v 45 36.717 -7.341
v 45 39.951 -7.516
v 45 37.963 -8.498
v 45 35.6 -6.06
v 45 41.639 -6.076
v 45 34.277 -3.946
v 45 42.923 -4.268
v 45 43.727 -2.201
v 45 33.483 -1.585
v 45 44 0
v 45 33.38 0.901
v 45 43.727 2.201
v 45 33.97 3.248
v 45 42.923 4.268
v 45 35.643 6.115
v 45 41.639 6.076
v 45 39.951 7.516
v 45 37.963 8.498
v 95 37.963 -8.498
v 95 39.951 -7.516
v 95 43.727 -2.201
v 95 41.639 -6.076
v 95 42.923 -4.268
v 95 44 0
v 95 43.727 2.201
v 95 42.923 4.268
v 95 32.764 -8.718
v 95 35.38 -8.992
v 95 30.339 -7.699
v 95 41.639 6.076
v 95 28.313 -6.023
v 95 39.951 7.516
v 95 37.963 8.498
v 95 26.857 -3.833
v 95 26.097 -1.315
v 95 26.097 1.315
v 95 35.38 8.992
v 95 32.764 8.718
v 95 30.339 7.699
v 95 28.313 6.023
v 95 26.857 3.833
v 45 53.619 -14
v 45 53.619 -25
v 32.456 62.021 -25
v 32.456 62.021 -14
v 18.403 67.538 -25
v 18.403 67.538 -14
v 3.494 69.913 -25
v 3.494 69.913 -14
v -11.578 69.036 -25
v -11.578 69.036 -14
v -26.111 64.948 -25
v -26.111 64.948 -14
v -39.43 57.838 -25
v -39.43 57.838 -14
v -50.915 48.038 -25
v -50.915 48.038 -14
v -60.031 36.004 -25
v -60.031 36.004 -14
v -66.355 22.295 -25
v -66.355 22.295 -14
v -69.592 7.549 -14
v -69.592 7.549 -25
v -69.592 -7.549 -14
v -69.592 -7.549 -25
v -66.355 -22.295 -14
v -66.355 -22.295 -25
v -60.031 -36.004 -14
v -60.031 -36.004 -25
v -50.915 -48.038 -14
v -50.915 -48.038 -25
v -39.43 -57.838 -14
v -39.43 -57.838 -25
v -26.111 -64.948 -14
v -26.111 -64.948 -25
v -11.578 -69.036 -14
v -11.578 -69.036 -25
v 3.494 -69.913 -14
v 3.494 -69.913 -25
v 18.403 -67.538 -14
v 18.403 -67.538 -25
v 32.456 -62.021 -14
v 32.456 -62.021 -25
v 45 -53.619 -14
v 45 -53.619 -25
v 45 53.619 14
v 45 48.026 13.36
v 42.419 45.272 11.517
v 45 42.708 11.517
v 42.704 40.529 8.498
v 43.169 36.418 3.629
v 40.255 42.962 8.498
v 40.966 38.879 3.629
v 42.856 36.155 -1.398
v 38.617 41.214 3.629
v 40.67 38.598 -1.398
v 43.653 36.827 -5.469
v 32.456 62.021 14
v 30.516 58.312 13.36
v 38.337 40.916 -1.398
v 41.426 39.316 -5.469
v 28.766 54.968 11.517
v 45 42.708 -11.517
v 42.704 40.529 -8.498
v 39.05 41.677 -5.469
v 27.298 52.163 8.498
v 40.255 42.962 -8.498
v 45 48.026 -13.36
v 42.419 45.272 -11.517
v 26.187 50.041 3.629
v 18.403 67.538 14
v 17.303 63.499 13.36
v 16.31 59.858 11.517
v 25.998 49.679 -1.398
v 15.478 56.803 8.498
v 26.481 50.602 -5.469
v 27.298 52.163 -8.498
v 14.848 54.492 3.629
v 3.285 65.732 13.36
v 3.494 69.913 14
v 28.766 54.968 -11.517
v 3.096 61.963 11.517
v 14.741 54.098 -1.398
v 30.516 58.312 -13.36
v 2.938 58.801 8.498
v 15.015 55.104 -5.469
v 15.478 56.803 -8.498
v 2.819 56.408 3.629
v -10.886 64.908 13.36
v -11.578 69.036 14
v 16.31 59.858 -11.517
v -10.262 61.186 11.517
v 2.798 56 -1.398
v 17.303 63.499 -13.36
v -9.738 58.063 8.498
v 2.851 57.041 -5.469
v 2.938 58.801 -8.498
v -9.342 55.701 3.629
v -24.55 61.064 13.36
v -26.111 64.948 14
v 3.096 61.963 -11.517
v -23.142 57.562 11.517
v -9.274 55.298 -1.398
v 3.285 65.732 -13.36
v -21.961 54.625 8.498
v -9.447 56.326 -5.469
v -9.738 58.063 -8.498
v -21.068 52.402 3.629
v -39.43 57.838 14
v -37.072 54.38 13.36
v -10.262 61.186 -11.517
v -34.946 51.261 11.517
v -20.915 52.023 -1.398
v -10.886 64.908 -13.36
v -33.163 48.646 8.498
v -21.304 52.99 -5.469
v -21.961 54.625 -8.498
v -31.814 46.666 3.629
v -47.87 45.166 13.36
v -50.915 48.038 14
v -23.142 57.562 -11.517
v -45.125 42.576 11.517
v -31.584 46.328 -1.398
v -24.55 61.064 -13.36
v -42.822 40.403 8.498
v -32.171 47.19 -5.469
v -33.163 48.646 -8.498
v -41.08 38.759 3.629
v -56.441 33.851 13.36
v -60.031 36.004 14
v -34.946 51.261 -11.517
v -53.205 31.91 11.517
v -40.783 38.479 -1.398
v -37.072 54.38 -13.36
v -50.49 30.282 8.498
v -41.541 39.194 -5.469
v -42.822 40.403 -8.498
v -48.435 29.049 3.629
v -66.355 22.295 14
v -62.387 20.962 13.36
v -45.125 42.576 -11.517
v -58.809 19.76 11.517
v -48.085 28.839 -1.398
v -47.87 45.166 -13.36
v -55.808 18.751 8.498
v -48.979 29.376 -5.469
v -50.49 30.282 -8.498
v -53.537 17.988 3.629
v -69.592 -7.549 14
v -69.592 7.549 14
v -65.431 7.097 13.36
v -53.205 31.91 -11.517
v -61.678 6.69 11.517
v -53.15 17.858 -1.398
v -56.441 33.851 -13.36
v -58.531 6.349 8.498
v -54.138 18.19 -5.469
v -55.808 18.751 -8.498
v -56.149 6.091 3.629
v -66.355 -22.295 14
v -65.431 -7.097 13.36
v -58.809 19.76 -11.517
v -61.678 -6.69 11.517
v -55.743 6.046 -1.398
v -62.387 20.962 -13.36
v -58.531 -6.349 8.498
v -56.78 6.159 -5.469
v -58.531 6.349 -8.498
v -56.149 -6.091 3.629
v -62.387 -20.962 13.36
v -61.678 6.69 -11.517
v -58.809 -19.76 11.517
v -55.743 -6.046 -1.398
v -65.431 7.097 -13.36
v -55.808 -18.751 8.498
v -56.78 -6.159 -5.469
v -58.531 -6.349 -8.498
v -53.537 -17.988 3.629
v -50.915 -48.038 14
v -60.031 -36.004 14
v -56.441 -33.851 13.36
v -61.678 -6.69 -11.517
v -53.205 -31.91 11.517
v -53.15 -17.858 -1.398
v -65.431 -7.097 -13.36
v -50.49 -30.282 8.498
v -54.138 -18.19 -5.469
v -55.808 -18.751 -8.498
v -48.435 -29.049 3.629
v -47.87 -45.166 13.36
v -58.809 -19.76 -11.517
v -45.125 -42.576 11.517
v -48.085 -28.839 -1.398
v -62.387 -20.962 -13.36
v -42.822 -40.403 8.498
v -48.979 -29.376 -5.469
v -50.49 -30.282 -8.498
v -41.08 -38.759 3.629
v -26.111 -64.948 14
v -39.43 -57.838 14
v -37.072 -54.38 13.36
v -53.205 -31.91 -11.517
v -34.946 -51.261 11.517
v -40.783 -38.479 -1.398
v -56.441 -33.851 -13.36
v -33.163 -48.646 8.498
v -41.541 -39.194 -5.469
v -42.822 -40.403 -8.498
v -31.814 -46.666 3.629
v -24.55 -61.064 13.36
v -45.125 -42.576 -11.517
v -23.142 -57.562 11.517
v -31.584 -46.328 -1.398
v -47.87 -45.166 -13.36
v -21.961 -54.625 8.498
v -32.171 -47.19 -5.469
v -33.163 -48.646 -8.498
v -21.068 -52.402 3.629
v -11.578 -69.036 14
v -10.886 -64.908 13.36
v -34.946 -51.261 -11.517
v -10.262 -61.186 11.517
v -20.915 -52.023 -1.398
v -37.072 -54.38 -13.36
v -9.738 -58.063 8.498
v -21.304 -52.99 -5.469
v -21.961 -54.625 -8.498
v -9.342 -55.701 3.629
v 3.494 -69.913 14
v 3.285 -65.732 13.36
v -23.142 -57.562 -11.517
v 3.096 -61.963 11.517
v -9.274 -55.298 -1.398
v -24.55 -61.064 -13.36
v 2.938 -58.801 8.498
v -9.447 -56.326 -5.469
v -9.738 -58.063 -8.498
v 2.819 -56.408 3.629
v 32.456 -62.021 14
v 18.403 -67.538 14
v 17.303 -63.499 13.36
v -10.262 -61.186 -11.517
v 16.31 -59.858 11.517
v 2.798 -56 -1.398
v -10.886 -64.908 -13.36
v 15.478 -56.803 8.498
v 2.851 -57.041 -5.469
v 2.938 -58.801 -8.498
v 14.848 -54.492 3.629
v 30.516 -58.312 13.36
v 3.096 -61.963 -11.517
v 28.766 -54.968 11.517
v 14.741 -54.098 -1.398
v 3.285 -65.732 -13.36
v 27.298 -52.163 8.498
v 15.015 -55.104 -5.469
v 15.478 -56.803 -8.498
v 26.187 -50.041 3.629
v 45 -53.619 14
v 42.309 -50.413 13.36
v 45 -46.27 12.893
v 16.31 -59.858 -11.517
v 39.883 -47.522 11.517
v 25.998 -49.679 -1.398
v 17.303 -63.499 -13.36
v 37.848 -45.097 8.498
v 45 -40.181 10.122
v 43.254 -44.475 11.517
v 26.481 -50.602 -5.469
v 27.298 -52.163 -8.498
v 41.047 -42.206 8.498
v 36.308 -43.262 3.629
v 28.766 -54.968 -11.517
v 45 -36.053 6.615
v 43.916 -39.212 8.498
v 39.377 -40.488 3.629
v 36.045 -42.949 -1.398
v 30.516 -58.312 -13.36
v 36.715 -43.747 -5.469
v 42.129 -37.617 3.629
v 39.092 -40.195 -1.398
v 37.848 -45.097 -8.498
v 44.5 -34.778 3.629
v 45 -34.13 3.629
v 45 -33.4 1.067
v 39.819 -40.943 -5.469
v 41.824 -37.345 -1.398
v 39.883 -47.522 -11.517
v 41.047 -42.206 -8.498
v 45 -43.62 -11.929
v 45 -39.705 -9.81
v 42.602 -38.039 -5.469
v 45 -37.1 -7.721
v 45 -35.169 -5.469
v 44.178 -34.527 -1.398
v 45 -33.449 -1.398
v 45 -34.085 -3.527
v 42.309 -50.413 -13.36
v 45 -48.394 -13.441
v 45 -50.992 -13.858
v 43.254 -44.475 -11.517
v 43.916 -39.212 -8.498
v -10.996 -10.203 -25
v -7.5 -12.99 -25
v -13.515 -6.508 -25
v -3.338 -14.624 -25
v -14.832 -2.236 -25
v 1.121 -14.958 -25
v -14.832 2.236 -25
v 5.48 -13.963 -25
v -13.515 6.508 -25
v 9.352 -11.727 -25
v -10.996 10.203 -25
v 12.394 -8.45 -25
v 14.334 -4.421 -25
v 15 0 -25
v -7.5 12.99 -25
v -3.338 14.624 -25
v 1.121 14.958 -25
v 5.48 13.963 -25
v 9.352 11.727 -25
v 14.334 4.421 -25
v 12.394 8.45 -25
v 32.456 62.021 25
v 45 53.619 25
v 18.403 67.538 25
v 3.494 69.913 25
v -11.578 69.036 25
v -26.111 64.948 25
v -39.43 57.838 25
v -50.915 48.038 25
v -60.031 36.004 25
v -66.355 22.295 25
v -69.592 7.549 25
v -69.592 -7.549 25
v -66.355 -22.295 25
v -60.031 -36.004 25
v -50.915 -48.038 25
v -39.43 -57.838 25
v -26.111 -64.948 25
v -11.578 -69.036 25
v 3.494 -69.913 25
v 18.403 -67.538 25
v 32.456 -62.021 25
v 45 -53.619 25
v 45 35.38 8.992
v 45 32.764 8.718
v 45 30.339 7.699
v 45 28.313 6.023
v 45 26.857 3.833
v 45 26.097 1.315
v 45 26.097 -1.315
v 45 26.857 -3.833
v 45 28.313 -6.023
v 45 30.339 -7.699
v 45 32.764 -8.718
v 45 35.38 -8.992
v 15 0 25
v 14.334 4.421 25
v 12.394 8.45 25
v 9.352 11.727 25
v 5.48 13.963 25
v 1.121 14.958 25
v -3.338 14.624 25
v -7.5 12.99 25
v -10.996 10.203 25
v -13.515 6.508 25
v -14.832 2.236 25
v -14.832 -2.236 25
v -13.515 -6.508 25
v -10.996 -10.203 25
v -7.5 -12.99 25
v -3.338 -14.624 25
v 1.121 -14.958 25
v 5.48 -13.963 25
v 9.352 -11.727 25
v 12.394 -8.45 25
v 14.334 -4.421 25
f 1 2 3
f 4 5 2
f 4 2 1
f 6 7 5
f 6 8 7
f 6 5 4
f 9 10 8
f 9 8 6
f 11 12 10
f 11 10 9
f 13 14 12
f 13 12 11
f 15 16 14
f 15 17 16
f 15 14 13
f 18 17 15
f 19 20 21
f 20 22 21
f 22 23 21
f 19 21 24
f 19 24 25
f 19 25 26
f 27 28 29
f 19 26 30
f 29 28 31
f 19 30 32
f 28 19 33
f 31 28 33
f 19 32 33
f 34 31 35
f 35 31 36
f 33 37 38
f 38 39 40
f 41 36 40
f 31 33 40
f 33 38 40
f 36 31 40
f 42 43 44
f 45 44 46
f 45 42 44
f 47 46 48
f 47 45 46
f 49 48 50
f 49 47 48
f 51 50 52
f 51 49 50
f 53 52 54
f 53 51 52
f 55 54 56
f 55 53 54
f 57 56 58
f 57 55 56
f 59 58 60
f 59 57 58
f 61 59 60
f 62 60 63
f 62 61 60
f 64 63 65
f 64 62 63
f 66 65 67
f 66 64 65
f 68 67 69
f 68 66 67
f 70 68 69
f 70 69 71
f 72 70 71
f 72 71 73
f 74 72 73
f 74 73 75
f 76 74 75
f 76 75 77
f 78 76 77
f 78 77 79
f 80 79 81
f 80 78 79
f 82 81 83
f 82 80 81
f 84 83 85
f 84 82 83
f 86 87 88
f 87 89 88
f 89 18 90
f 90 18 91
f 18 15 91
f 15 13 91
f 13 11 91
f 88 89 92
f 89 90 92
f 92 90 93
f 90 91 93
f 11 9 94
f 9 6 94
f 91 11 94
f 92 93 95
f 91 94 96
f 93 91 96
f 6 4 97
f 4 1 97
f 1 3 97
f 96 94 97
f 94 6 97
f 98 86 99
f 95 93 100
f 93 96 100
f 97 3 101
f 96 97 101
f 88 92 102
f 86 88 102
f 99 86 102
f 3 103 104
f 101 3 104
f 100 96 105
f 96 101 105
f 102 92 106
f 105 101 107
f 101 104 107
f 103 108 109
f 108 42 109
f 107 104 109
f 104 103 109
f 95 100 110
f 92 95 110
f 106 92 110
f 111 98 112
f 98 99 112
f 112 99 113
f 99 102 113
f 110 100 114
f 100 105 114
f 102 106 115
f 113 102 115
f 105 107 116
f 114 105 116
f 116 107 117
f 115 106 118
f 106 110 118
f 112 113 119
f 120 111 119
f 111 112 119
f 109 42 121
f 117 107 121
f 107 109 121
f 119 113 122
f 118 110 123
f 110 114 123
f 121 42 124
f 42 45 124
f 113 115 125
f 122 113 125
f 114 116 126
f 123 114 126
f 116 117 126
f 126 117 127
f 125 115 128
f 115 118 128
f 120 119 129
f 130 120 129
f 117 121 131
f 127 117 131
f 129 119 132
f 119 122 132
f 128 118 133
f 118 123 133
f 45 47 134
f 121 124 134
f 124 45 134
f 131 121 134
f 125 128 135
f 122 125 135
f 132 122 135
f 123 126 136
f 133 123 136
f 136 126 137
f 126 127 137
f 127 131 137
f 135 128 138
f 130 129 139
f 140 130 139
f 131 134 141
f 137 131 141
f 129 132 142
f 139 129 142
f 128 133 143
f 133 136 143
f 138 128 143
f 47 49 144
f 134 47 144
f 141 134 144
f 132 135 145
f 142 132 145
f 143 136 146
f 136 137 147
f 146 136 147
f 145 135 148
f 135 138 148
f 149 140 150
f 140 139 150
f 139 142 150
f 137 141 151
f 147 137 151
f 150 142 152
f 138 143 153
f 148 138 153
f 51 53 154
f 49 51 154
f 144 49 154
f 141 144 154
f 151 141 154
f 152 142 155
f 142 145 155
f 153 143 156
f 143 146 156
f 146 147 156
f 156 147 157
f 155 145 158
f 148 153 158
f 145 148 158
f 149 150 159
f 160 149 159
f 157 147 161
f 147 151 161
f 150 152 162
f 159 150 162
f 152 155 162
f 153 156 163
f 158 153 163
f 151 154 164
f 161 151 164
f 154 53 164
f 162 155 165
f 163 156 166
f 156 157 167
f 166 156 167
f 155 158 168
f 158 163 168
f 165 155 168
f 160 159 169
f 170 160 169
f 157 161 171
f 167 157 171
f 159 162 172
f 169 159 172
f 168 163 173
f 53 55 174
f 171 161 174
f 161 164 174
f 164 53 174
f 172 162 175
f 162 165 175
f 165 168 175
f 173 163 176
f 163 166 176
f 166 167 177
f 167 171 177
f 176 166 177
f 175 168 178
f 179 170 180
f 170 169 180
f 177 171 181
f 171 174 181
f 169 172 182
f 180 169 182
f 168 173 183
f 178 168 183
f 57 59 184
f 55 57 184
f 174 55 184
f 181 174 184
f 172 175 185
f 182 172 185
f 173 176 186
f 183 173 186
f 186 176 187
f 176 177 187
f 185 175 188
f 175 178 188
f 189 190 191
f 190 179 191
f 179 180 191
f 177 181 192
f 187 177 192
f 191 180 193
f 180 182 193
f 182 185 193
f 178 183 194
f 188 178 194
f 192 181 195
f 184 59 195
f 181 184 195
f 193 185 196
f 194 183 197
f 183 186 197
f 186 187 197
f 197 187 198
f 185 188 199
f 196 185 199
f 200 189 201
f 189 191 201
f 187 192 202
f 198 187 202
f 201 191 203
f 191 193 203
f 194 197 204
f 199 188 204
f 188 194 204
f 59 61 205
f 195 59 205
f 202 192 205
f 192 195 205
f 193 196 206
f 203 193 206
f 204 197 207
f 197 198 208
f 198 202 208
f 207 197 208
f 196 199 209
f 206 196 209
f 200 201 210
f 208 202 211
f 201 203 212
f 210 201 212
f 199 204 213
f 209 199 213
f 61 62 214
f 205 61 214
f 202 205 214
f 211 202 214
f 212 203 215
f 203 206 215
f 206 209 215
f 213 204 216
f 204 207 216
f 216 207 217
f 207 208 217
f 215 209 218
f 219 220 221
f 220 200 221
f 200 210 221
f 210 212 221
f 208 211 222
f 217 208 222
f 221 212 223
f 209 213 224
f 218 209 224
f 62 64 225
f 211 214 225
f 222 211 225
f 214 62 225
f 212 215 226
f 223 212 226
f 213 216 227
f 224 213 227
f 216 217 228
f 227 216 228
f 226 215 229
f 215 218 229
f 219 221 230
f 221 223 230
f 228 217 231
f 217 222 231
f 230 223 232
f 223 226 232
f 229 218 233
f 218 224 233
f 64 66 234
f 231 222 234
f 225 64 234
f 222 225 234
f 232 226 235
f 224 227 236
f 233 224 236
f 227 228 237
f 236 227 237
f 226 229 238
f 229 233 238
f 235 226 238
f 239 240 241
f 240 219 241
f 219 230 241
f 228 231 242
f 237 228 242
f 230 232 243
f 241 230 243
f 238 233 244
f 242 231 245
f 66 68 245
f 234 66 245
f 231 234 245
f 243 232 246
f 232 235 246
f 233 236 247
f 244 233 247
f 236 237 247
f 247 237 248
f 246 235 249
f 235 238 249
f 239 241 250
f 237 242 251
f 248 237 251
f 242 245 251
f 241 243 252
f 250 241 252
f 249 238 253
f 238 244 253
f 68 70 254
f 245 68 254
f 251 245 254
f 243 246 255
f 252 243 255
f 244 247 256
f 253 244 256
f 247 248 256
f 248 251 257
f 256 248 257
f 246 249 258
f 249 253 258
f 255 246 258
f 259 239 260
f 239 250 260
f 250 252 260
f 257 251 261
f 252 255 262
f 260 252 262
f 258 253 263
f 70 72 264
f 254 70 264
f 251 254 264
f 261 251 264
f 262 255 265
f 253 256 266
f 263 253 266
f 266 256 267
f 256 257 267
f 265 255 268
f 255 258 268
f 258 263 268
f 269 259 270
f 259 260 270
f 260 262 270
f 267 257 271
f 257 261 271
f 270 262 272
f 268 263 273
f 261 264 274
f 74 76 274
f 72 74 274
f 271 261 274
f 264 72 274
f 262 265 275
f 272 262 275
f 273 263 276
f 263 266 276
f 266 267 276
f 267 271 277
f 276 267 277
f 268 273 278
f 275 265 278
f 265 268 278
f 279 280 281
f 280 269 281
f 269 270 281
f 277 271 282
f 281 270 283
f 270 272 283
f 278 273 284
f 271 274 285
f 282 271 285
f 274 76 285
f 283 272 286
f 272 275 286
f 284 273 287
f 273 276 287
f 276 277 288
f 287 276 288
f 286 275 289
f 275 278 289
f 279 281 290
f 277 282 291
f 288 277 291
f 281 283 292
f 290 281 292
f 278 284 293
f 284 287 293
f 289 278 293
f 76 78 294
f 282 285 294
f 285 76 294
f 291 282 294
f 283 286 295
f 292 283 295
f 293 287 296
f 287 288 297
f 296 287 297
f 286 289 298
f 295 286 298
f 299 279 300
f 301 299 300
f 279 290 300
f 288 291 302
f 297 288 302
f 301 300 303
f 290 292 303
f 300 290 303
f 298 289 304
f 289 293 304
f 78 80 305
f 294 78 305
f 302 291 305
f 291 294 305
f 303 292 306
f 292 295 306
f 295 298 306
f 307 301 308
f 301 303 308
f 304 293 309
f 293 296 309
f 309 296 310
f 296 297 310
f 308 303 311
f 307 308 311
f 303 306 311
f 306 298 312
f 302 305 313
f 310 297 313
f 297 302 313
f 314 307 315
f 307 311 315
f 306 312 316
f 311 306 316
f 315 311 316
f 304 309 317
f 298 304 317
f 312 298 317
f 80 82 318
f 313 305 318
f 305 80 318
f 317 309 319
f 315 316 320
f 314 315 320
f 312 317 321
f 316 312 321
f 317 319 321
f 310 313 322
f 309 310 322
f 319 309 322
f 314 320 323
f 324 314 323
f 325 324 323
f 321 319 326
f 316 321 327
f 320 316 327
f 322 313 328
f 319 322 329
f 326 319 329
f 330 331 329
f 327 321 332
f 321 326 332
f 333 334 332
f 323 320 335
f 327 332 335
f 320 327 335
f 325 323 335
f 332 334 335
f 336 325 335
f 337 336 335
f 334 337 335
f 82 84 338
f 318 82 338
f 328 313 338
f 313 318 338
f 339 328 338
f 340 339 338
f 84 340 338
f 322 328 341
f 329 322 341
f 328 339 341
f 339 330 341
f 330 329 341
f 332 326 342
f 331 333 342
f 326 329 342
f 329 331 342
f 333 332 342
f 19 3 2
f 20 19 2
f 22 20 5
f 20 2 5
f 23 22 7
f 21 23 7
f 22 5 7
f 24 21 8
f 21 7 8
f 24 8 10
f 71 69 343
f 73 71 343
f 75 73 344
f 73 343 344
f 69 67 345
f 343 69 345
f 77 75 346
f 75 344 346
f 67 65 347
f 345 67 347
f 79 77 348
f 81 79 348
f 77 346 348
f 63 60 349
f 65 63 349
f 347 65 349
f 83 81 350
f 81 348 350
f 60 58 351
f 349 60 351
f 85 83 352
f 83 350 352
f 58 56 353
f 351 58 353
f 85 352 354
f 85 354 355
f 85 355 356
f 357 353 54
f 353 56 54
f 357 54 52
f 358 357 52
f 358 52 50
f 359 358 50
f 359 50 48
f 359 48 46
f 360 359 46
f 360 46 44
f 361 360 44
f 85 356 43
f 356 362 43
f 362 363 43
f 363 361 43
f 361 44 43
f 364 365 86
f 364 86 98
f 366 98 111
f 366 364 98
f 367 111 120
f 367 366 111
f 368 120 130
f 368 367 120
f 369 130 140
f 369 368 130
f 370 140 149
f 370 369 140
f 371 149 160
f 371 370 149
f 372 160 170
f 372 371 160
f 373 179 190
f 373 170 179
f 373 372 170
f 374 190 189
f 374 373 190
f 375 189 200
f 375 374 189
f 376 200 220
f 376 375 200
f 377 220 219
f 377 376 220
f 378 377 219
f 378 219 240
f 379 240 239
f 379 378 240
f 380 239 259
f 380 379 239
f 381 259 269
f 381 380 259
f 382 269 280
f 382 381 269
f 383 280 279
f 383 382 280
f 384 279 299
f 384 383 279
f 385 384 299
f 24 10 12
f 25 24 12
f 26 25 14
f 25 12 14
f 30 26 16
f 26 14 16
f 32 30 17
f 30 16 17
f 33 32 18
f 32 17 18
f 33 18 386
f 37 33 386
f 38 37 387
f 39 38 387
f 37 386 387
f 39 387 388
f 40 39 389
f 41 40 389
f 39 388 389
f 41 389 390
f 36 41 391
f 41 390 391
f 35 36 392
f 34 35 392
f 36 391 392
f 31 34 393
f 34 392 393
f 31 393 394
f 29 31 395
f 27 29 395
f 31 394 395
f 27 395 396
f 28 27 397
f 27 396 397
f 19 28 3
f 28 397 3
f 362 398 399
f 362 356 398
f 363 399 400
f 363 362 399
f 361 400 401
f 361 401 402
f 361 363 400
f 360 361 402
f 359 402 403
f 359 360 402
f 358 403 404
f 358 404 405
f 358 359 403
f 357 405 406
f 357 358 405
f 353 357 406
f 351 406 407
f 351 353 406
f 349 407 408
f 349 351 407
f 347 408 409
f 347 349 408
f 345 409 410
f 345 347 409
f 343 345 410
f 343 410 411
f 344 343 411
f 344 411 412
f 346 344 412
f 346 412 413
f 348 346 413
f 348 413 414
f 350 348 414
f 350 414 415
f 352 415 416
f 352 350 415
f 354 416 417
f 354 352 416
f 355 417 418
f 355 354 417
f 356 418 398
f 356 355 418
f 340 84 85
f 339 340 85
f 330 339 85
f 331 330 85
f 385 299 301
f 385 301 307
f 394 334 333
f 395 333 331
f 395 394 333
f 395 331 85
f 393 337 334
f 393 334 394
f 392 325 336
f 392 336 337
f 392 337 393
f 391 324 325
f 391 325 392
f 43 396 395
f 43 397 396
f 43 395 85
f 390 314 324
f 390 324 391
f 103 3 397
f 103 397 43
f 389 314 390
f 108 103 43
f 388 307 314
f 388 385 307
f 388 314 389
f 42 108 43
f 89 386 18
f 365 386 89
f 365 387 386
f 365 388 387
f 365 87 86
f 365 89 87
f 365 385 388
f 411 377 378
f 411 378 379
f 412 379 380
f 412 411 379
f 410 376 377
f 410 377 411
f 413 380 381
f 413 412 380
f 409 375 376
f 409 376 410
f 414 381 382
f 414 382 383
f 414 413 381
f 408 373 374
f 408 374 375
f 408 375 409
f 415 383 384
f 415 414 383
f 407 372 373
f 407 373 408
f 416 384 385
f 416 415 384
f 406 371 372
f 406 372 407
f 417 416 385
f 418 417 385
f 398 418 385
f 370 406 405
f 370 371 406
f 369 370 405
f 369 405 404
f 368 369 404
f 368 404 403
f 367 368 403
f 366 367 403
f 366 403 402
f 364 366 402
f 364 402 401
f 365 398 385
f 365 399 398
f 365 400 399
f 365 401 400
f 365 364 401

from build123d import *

# Parameters (mm, degrees)
F0_R     = 15
F1_DEPTH = 25
F5_DEPTH = 50


with BuildPart() as f1:
    # F0 (on Top) → F1 (new body, symmetric)
    with BuildSketch(Plane.XY):
        with BuildLine():
            Line((45, -53.6190264738), (45, 53.6190264738))
            ThreePointArc((45, 53.6190264738), (-70, 0), (45, -53.6190264738))
        make_face()
        Circle(F0_R, mode=Mode.SUBTRACT)
    extrude(amount=F1_DEPTH, both=True)

    # F2 (on Right) → F3 (revolve, cut)
    with BuildSketch(Plane.YZ):
        with BuildLine():
            Line((70, -14), (70, 14))
            ThreePointArc((70, 14), (56, 0), (70, -14))
        make_face()
    revolve(axis=Axis((0, 0, 25), (0, 0, 1)), mode=Mode.SUBTRACT)

    # F4 (on face) → F5 (join)
    with BuildSketch(Plane.YZ.offset(45)):
        with BuildLine():
            add(Edge.make_bspline(
                [(37.9630328609, 8.4982607788), (37.8523435019, 8.4048203415), (37.7424820724, 8.3104014762), (37.6334707776, 8.2149986154), (37.525332792, 8.1186060884), (37.4180922716, 8.0212181078), (37.3117743656, 7.9228287563), (37.2064052286, 7.823431974), (36.826236873, 7.4577676485), (36.5572934764, 7.185459665), (36.2956678052, 6.9059722624), (36.041930817, 6.6191996988), (35.7967338532, 6.3250596485), (35.5608040283, 6.0234970289), (35.3349396191, 5.7144878262), (34.9596041272, 5.1618860399), (34.8053000417, 4.9216027682), (34.6574566137, 4.677206923), (34.5164662374, 4.4287401627), (34.3827450871, 4.1762748231), (34.2567257621, 3.9199178725), (34.1388477747, 3.6598159897), (33.972823057, 3.2593369411), (33.9184105228, 3.1215569007), (33.8663694036, 2.9828498623), (33.8167604551, 2.8432475247), (33.769643447, 2.7027852726), (33.7250765475, 2.5615023849), (33.6831157079, 2.4194422423), (33.567344253, 1.998824599), (33.5009341193, 1.7182071188), (33.444986335, 1.43518271), (33.399847873, 1.1501662245), (33.3657973112, 0.8636063961), (33.3430321538, 0.5759874866), (33.331656153, 0.2878309318), (33.3316772398, -0.2920603513), (33.3433625212, -0.5838406442), (33.36672517, -0.8750615205), (33.4016558858, -1.1651818297), (33.4479469745, -1.4536998647), (33.5053059499, -1.7401515835), (33.5733691351, -2.024108832), (33.6915046183, -2.4479228858), (33.7339482932, -2.5899306957), (33.7789927091, -2.7311537294), (33.82658152, -2.8715490352), (33.8766562279, -3.0110777655), (33.9291567963, -3.1497049676), (33.984022265, -3.2873993744), (34.1490037446, -3.6819927579), (34.2650067533, -3.9364311557), (34.3887918355, -4.1872704013), (34.5199466609, -4.4343744462), (34.6580655419, -4.6776436303), (34.8027579562, -4.9170101221), (34.9536551707, -5.1524343498), (35.3248066319, -5.7004684421), (35.5501463092, -6.0096084062), (35.7855690187, -6.3113088937), (36.030274827, -6.6055929723), (36.2835351055, -6.8925150275), (36.5446977166, -7.1721564153), (36.8131911273, -7.4446219389), (37.1944947346, -7.8121861418), (37.3014725192, -7.9132878967), (37.409432192, -8.0133489318), (37.5183462275, -8.1123756019), (37.6281881757, -8.2103741117), (37.7389326494, -8.3073505305), (37.8505553113, -8.403310806), (37.9630328615, -8.4982607786)],
                knots=[0.3142800556, 0.3142800556, 0.3142800556, 0.3142800556, 0.3142800556, 0.3142800556, 0.3142800556, 0.3142800556, 0.3142800556, 0.3358087351, 0.3358087351, 0.3358087351, 0.3358087351, 0.3358087351, 0.3358087351, 0.3358087351, 0.3926809759, 0.3926809759, 0.3926809759, 0.3926809759, 0.3926809759, 0.3926809759, 0.3926809759, 0.43512366, 0.43512366, 0.43512366, 0.43512366, 0.43512366, 0.43512366, 0.43512366, 0.4571495261, 0.4571495261, 0.4571495261, 0.4571495261, 0.4571495261, 0.4571495261, 0.4571495261, 0.5000055628, 0.5000055628, 0.5000055628, 0.5000055628, 0.5000055628, 0.5000055628, 0.5000055628, 0.5434005305, 0.5434005305, 0.5434005305, 0.5434005305, 0.5434005305, 0.5434005305, 0.5434005305, 0.5654393693, 0.5654393693, 0.5654393693, 0.5654393693, 0.5654393693, 0.5654393693, 0.5654393693, 0.6070013278, 0.6070013278, 0.6070013278, 0.6070013278, 0.6070013278, 0.6070013278, 0.6070013278, 0.6638433094, 0.6638433094, 0.6638433094, 0.6638433094, 0.6638433094, 0.6638433094, 0.6638433094, 0.6857197919, 0.6857197919, 0.6857197919, 0.6857197919, 0.6857197919, 0.6857197919, 0.6857197919, 0.6857197919, 0.6857197919], degree=8))
            ThreePointArc((37.9630328609, 8.4982607788), (26, -3e-10), (37.9630328615, -8.4982607786))
        make_face()
        with BuildLine():
            ThreePointArc((37.9630328615, -8.4982607786), (42.3371416694, -5.212135083), (44, 0))
            ThreePointArc((44, 0), (42.3371416692, 5.2121350832), (37.9630328609, 8.4982607788))
            add(Edge.make_bspline(
                [(37.9630328609, 8.4982607788), (37.8523435019, 8.4048203415), (37.7424820724, 8.3104014762), (37.6334707776, 8.2149986154), (37.525332792, 8.1186060884), (37.4180922716, 8.0212181078), (37.3117743656, 7.9228287563), (37.2064052286, 7.823431974), (36.826236873, 7.4577676485), (36.5572934764, 7.185459665), (36.2956678052, 6.9059722624), (36.041930817, 6.6191996988), (35.7967338532, 6.3250596485), (35.5608040283, 6.0234970289), (35.3349396191, 5.7144878262), (34.9596041272, 5.1618860399), (34.8053000417, 4.9216027682), (34.6574566137, 4.677206923), (34.5164662374, 4.4287401627), (34.3827450871, 4.1762748231), (34.2567257621, 3.9199178725), (34.1388477747, 3.6598159897), (33.972823057, 3.2593369411), (33.9184105228, 3.1215569007), (33.8663694036, 2.9828498623), (33.8167604551, 2.8432475247), (33.769643447, 2.7027852726), (33.7250765475, 2.5615023849), (33.6831157079, 2.4194422423), (33.567344253, 1.998824599), (33.5009341193, 1.7182071188), (33.444986335, 1.43518271), (33.399847873, 1.1501662245), (33.3657973112, 0.8636063961), (33.3430321538, 0.5759874866), (33.331656153, 0.2878309318), (33.3316772398, -0.2920603513), (33.3433625212, -0.5838406442), (33.36672517, -0.8750615205), (33.4016558858, -1.1651818297), (33.4479469745, -1.4536998647), (33.5053059499, -1.7401515835), (33.5733691351, -2.024108832), (33.6915046183, -2.4479228858), (33.7339482932, -2.5899306957), (33.7789927091, -2.7311537294), (33.82658152, -2.8715490352), (33.8766562279, -3.0110777655), (33.9291567963, -3.1497049676), (33.984022265, -3.2873993744), (34.1490037446, -3.6819927579), (34.2650067533, -3.9364311557), (34.3887918355, -4.1872704013), (34.5199466609, -4.4343744462), (34.6580655419, -4.6776436303), (34.8027579562, -4.9170101221), (34.9536551707, -5.1524343498), (35.3248066319, -5.7004684421), (35.5501463092, -6.0096084062), (35.7855690187, -6.3113088937), (36.030274827, -6.6055929723), (36.2835351055, -6.8925150275), (36.5446977166, -7.1721564153), (36.8131911273, -7.4446219389), (37.1944947346, -7.8121861418), (37.3014725192, -7.9132878967), (37.409432192, -8.0133489318), (37.5183462275, -8.1123756019), (37.6281881757, -8.2103741117), (37.7389326494, -8.3073505305), (37.8505553113, -8.403310806), (37.9630328615, -8.4982607786)],
                knots=[0.3142800556, 0.3142800556, 0.3142800556, 0.3142800556, 0.3142800556, 0.3142800556, 0.3142800556, 0.3142800556, 0.3142800556, 0.3358087351, 0.3358087351, 0.3358087351, 0.3358087351, 0.3358087351, 0.3358087351, 0.3358087351, 0.3926809759, 0.3926809759, 0.3926809759, 0.3926809759, 0.3926809759, 0.3926809759, 0.3926809759, 0.43512366, 0.43512366, 0.43512366, 0.43512366, 0.43512366, 0.43512366, 0.43512366, 0.4571495261, 0.4571495261, 0.4571495261, 0.4571495261, 0.4571495261, 0.4571495261, 0.4571495261, 0.5000055628, 0.5000055628, 0.5000055628, 0.5000055628, 0.5000055628, 0.5000055628, 0.5000055628, 0.5434005305, 0.5434005305, 0.5434005305, 0.5434005305, 0.5434005305, 0.5434005305, 0.5434005305, 0.5654393693, 0.5654393693, 0.5654393693, 0.5654393693, 0.5654393693, 0.5654393693, 0.5654393693, 0.6070013278, 0.6070013278, 0.6070013278, 0.6070013278, 0.6070013278, 0.6070013278, 0.6070013278, 0.6638433094, 0.6638433094, 0.6638433094, 0.6638433094, 0.6638433094, 0.6638433094, 0.6638433094, 0.6857197919, 0.6857197919, 0.6857197919, 0.6857197919, 0.6857197919, 0.6857197919, 0.6857197919, 0.6857197919, 0.6857197919], degree=8))
        make_face()
    extrude(amount=F5_DEPTH)


solid = f1.part
